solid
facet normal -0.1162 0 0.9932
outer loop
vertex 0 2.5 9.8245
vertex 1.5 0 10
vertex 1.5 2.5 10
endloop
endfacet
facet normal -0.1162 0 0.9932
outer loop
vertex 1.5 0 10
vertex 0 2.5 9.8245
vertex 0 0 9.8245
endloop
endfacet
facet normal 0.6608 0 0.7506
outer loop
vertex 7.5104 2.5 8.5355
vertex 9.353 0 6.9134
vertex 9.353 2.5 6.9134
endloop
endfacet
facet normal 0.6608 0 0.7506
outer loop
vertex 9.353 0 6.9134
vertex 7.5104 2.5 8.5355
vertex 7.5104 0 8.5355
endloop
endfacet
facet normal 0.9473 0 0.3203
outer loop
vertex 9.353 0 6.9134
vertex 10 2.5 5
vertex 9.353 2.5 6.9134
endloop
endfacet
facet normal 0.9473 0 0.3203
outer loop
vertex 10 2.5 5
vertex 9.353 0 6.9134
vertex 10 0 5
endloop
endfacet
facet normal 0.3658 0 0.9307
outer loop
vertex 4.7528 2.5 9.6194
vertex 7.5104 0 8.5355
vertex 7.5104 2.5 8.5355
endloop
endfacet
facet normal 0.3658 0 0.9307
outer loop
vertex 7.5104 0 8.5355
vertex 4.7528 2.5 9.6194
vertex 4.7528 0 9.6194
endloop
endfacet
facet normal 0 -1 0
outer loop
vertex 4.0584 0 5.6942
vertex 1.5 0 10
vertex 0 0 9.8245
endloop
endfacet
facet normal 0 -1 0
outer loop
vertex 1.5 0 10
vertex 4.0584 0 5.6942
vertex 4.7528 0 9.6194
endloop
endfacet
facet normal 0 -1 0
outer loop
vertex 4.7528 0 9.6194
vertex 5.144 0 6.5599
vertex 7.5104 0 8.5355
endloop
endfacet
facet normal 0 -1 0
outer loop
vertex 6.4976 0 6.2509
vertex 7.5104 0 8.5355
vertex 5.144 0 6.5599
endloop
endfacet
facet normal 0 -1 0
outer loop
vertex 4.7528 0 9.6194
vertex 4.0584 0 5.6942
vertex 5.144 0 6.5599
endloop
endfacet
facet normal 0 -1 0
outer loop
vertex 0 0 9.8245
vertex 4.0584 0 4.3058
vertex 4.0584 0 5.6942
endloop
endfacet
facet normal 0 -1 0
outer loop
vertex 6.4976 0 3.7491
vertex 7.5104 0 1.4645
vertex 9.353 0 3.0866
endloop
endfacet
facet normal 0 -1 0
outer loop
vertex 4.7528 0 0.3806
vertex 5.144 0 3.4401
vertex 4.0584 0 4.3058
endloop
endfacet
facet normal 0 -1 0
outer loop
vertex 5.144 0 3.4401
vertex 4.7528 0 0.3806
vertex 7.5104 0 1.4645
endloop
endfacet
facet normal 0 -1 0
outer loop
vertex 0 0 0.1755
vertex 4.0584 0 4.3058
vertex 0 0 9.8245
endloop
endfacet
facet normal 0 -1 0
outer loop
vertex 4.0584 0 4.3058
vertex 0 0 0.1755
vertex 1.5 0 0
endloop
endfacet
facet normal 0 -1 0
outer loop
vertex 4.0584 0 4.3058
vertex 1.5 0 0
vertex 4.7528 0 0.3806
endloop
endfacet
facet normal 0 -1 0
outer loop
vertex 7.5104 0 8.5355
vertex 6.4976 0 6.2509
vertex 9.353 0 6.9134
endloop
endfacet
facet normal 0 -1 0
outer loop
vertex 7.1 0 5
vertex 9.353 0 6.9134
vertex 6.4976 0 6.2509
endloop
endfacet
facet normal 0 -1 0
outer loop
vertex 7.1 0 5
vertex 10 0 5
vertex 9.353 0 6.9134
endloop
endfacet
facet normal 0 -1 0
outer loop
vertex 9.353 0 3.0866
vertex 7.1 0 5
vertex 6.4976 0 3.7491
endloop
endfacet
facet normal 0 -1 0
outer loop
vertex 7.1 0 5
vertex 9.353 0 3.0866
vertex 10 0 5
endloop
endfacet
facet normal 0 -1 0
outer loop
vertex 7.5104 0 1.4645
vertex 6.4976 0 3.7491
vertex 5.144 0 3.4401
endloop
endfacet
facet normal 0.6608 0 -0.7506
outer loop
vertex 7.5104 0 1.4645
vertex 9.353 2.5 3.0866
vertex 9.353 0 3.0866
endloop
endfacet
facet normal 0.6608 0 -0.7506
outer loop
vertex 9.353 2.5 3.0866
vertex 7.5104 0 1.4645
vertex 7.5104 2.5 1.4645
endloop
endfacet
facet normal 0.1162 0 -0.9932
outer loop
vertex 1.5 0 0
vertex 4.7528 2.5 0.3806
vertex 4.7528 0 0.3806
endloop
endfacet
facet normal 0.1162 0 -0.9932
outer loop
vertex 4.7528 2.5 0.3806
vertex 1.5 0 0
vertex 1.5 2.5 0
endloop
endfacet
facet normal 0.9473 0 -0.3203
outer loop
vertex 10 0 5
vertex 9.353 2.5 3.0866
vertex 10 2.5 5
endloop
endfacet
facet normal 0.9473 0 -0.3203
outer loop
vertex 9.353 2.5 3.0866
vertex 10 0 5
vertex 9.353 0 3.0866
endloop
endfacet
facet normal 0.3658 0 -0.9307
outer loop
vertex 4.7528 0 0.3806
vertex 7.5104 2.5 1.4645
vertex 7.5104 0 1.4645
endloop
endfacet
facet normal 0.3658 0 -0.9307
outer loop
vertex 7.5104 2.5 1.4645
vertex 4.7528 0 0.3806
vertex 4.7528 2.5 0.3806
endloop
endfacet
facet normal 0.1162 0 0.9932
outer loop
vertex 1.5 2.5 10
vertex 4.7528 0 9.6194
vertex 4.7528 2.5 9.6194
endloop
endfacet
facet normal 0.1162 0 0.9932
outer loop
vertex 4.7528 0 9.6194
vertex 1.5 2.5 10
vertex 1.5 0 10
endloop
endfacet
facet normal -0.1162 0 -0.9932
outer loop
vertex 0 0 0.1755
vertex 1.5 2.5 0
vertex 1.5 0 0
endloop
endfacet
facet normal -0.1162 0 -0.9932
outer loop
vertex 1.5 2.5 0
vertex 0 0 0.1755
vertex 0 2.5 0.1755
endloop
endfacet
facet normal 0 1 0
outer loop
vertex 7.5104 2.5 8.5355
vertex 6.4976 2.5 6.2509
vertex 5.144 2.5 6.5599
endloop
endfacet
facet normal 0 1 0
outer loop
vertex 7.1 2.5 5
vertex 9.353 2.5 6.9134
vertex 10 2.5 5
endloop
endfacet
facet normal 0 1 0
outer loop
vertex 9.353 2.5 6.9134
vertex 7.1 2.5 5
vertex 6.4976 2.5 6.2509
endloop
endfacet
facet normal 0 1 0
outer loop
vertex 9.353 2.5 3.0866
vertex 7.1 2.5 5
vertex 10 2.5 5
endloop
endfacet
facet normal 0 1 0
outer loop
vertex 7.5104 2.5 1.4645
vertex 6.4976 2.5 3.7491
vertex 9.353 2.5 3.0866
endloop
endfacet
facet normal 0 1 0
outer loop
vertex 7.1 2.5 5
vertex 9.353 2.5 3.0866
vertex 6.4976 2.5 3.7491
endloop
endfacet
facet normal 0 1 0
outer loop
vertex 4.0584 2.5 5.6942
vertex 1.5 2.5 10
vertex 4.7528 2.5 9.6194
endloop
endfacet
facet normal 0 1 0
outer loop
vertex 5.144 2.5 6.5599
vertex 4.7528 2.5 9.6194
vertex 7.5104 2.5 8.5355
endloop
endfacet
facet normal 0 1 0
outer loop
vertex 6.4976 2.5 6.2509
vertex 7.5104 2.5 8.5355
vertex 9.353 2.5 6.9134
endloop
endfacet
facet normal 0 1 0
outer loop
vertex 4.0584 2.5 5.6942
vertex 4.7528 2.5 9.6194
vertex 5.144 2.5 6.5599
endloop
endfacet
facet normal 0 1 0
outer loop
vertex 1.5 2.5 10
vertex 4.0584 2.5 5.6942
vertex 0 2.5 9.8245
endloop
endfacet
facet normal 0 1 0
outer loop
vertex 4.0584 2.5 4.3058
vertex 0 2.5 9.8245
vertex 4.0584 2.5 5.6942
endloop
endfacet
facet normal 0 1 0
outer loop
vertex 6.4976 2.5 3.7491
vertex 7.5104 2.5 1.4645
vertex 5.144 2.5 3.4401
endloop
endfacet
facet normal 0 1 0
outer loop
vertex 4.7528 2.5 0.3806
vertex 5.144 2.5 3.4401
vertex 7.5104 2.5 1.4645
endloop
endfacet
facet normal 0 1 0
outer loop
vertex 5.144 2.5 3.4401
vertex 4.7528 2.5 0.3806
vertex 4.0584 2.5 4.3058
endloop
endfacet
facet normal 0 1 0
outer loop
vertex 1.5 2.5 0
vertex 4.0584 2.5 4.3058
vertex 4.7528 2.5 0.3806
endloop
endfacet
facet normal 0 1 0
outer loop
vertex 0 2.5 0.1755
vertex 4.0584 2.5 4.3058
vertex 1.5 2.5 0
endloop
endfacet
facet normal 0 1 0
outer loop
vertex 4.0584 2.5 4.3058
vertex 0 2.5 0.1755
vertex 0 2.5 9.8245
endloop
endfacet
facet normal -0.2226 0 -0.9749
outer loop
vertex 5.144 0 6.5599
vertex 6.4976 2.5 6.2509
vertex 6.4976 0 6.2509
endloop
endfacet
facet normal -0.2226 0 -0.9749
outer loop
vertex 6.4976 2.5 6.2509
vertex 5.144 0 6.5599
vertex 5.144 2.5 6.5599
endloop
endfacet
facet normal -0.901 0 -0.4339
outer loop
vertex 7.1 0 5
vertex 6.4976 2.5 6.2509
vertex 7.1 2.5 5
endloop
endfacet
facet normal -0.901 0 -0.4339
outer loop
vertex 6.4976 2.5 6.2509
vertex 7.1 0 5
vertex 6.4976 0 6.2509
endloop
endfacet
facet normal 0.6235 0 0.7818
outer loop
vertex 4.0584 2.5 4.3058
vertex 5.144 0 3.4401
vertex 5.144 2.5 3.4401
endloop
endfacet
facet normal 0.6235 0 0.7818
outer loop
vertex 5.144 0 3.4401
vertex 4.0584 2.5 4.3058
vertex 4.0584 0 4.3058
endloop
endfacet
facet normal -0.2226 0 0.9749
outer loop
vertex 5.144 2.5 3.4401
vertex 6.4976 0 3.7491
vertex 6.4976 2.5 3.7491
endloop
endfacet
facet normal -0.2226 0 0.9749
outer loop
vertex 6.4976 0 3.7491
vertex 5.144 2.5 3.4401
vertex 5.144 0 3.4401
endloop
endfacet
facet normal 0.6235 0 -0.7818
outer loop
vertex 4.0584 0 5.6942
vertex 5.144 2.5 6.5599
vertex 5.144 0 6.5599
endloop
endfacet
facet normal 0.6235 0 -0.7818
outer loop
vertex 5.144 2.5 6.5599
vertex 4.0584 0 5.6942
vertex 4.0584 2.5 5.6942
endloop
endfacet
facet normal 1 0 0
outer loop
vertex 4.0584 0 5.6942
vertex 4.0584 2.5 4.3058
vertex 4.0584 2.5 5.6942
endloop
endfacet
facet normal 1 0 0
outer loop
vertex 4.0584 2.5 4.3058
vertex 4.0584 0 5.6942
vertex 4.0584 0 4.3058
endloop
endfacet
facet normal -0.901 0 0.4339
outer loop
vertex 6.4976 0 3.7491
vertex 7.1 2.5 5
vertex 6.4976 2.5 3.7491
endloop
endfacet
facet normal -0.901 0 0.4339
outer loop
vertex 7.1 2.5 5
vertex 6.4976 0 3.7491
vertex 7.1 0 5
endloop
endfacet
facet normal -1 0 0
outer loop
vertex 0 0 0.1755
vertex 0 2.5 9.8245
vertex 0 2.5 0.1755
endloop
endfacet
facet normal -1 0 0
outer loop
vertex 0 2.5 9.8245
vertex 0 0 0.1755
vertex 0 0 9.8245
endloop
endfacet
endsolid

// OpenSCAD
module connector(w=2.5) {
  translate([1.5, w, 5])
  difference() {
    rotate([90])
      scale([1.7,1])
      cylinder(r=5, h=w);
    rotate([90])
      translate([4,0])
      cylinder(r=1.6, h=w, $fn=7);
    translate([-11.5, -3, -5])
    cube([10,4,10]);
  }
}

module connectors() {
  connector();
  translate([0, 5]) connector();
  translate([0, 10]) connector();
}

connector();
